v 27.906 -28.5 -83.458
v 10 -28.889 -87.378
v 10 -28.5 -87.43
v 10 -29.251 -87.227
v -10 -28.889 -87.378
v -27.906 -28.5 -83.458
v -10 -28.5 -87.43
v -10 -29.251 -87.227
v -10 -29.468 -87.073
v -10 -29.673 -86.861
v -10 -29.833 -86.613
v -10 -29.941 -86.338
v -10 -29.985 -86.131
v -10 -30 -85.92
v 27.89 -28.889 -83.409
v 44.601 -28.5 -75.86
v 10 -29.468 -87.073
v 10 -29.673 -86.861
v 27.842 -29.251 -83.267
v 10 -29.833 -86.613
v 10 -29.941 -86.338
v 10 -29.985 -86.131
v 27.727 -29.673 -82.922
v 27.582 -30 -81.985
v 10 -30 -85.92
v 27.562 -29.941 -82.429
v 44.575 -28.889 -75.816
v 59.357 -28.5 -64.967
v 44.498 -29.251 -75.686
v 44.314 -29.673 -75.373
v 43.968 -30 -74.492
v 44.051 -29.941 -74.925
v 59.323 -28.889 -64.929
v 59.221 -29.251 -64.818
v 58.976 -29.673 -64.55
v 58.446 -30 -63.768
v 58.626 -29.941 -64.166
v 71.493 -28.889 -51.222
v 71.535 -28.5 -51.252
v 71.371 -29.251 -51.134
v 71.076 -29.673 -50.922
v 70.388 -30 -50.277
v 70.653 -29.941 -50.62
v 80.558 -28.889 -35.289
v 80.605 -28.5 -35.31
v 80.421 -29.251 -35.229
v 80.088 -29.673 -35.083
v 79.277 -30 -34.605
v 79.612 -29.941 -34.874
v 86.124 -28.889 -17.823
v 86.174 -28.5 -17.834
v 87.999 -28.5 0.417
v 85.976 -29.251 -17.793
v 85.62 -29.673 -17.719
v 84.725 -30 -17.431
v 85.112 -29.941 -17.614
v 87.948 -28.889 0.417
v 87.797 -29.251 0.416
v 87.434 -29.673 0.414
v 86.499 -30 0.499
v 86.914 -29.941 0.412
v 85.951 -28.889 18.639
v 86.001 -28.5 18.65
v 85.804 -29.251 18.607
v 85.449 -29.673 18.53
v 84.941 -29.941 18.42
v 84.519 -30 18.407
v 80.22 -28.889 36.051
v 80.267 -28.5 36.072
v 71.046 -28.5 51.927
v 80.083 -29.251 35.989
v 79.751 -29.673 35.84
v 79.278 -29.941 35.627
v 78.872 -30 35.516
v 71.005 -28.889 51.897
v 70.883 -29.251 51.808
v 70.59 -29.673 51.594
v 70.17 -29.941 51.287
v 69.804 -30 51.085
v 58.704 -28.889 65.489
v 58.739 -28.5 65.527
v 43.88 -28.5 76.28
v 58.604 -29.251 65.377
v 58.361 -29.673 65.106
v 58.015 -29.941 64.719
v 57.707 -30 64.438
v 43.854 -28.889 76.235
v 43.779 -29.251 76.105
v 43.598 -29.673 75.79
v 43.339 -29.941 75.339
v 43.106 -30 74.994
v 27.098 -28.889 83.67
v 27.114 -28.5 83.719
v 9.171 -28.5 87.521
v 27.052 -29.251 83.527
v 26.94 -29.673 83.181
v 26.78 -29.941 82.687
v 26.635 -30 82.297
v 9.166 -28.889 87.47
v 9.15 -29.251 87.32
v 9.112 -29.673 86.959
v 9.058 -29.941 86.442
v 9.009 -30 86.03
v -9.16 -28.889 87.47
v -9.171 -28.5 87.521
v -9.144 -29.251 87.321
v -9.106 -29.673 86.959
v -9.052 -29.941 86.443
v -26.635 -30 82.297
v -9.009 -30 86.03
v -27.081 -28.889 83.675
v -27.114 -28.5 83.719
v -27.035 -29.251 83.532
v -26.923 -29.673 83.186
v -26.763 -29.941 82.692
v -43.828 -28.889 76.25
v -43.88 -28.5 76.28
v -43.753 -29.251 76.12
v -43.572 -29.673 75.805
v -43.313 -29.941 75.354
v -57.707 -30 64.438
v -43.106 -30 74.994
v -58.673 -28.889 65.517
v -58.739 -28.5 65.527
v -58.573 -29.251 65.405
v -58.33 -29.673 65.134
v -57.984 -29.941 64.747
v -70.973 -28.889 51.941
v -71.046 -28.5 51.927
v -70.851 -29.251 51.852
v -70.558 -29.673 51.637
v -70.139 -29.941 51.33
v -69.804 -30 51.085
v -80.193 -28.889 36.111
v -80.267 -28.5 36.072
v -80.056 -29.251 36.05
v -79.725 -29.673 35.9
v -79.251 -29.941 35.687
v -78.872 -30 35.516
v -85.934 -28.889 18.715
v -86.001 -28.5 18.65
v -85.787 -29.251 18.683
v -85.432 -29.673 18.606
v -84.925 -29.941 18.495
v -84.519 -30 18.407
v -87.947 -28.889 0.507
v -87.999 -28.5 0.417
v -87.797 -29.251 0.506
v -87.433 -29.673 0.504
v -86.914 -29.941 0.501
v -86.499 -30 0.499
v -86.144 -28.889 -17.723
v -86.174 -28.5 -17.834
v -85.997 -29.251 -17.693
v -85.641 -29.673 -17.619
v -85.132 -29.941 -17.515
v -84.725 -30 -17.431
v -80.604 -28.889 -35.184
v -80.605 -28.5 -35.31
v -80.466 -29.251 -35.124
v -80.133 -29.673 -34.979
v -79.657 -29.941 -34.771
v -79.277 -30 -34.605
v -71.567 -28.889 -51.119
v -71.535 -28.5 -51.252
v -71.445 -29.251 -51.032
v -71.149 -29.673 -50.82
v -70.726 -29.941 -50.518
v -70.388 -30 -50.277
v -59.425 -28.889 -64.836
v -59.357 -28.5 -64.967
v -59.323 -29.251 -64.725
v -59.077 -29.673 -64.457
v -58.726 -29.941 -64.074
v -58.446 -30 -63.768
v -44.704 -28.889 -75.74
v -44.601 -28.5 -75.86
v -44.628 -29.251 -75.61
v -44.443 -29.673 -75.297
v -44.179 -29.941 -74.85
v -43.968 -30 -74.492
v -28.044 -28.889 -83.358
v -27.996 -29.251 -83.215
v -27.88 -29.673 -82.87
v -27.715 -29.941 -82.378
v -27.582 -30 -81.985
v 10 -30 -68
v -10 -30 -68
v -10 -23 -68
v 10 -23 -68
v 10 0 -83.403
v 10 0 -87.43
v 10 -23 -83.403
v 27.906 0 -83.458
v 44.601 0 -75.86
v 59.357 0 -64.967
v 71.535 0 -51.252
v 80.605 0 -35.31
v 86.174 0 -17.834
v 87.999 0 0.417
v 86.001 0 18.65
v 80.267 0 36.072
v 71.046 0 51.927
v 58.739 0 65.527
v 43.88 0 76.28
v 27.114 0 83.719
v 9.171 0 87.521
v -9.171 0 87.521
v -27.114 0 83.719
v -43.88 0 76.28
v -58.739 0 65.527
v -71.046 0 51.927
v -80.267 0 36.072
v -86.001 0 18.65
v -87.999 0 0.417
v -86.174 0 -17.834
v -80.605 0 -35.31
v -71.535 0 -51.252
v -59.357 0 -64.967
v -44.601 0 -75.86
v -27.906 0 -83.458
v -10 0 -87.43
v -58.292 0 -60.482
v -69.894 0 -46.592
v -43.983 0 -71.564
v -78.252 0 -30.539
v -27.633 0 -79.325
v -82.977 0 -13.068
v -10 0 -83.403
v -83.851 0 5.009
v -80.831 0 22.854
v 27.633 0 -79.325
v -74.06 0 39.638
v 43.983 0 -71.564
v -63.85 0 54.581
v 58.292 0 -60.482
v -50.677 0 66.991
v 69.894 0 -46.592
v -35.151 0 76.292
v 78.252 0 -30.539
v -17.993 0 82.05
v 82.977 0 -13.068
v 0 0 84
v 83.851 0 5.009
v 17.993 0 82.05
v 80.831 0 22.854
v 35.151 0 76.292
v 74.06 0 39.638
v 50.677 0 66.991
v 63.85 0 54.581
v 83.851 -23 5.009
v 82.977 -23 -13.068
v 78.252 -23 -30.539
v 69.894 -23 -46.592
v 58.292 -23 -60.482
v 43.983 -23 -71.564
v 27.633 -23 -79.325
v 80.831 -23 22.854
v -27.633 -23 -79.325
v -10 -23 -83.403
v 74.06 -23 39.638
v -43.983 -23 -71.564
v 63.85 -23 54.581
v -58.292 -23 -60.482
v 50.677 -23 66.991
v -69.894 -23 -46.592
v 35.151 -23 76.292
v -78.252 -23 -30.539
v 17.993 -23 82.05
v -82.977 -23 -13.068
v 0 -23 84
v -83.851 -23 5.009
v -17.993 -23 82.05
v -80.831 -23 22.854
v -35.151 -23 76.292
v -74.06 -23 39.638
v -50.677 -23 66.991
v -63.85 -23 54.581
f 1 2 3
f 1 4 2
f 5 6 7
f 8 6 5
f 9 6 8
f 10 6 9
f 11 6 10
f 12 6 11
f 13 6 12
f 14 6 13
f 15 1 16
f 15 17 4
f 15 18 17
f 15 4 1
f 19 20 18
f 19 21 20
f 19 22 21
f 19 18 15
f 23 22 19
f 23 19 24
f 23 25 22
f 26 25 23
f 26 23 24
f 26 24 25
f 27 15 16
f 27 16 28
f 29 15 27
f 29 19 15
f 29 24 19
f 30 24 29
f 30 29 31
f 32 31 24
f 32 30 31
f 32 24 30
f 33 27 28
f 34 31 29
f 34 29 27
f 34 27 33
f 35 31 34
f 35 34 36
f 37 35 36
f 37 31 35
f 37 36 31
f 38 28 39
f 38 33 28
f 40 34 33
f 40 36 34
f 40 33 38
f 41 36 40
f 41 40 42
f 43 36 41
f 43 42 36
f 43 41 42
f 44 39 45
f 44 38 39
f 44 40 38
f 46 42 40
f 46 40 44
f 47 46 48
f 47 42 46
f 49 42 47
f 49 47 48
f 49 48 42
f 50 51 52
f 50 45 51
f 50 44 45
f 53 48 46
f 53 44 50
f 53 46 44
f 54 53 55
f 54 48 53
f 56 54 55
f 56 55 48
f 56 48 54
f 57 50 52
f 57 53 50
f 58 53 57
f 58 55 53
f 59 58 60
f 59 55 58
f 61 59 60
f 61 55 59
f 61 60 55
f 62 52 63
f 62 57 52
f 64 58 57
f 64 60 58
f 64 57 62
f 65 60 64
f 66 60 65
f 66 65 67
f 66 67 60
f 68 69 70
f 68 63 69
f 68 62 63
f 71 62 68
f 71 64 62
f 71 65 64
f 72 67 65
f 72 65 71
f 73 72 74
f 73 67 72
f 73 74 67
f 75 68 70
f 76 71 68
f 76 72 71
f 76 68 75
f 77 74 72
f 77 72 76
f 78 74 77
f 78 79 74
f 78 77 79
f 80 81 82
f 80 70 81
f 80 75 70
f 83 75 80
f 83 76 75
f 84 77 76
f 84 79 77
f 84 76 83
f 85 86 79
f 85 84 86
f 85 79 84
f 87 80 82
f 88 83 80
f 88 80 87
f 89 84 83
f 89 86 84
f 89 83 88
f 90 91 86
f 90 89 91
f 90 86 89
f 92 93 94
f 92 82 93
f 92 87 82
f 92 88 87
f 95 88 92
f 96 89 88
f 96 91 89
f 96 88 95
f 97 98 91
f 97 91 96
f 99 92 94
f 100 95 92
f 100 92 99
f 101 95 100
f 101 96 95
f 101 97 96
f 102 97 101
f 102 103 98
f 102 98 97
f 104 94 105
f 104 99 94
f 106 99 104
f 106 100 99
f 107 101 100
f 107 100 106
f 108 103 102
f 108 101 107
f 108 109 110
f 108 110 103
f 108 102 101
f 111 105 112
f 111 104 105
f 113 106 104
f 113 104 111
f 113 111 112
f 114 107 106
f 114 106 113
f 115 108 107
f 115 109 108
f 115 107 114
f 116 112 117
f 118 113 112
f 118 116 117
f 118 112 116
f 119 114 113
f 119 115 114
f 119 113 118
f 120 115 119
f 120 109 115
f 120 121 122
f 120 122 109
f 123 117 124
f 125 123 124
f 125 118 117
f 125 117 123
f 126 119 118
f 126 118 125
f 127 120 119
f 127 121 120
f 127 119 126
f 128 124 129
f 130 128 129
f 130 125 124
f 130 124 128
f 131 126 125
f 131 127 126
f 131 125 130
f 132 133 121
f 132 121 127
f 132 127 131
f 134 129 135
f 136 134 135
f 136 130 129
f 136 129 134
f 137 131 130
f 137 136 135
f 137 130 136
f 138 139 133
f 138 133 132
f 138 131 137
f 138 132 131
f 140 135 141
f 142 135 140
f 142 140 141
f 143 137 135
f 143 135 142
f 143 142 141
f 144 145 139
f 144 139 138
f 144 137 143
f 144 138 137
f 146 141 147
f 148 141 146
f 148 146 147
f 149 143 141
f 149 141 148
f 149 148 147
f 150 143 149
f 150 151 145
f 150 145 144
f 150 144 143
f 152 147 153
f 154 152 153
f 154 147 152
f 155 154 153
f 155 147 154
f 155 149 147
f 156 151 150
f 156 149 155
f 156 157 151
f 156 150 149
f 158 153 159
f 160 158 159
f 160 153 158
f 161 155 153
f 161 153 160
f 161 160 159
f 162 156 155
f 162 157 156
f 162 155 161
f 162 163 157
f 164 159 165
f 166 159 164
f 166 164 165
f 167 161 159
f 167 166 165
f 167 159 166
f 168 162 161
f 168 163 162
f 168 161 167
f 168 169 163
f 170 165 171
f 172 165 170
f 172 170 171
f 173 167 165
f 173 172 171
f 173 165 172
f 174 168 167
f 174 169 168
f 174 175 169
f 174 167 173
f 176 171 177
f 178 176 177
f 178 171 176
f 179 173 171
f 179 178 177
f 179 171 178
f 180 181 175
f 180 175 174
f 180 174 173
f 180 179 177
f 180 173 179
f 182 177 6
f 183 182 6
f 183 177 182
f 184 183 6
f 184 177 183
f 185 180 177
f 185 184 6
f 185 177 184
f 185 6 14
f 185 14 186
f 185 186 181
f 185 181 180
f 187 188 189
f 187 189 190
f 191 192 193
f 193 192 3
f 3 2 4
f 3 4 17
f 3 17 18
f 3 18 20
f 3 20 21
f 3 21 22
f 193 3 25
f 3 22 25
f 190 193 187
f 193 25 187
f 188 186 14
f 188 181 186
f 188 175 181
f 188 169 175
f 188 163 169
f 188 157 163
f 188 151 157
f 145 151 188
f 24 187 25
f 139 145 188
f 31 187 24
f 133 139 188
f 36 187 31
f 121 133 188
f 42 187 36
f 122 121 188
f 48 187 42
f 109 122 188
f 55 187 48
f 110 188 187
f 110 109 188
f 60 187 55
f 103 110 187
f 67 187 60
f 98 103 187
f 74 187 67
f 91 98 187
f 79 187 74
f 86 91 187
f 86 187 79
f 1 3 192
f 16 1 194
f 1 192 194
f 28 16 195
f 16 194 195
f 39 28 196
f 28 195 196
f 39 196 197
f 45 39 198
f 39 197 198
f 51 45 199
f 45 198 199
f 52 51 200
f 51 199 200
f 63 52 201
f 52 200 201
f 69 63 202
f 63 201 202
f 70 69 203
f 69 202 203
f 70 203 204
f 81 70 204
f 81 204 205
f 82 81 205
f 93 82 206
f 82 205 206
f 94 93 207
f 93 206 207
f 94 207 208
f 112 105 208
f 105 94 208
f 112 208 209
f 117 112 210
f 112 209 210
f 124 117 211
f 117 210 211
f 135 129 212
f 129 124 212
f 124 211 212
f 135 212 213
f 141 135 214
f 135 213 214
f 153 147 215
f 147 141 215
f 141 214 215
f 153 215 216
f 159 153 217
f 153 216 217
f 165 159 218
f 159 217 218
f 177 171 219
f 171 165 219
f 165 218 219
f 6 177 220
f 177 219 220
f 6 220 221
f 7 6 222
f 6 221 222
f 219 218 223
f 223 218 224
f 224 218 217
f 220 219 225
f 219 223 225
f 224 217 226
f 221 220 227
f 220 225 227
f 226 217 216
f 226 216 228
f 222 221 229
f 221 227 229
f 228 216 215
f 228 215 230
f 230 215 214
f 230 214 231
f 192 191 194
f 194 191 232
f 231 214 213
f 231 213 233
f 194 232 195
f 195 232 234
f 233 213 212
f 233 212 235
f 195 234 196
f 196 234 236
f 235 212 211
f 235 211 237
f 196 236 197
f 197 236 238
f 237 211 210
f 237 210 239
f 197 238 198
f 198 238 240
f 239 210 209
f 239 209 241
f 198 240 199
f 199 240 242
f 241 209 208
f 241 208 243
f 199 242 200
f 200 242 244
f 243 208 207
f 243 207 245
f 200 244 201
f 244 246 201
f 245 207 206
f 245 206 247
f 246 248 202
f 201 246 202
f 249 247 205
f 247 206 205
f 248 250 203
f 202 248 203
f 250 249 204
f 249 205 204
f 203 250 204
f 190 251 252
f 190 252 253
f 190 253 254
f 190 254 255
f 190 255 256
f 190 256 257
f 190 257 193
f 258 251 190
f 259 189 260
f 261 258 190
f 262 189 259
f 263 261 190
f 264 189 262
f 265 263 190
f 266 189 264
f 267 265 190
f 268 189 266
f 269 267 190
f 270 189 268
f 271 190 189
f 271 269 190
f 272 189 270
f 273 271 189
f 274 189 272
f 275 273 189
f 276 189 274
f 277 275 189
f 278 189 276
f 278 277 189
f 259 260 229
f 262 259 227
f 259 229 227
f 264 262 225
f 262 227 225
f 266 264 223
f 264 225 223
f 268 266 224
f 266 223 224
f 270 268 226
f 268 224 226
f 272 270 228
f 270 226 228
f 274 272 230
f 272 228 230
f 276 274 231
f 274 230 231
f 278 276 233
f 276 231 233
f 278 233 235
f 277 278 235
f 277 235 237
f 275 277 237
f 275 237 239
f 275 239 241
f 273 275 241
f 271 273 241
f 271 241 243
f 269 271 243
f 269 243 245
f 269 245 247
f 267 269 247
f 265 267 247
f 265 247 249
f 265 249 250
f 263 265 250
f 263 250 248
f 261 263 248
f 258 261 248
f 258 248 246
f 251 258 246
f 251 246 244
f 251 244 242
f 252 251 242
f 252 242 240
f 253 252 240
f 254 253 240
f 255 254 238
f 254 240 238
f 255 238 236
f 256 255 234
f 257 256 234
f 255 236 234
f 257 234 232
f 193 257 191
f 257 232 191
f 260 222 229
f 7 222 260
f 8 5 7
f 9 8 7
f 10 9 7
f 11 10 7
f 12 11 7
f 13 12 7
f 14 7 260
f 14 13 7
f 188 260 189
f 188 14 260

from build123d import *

# Parameters (mm, degrees)
F0_R     = 88
F1_DEPTH = 30
F2_R     = 84
F3_DEPTH = 23
F4_R     = 1.5
F5_W     = 20
F5_H     = 20
F6_DEPTH = 30.001


# Not quite as in the source:
# - a feature names something its author has since deleted; it is built from what else it names


with BuildPart() as f1:
    # F0 (on Front) → F1 (new body)
    with BuildSketch(Plane.XZ):
        Circle(F0_R)
    extrude(amount=F1_DEPTH)

    # F2 (on face) → F3 (cut)
    with BuildSketch(Plane(origin=(0, 0, 0), x_dir=(-1, 0, 0), z_dir=(0, 1, 0))):
        Circle(F2_R)
    extrude(amount=-F3_DEPTH, mode=Mode.SUBTRACT)

    # F4
    f4_edges = [f1.edges().sort_by_distance(p)[0] for p in [
        (-88, -30, 0),
    ]]
    fillet(f4_edges, radius=F4_R)

    # F5 (on face) → F6 (cut, through all)
    with BuildSketch(Plane.XZ.offset(30)):
        with Locations((0, -78)):
            Rectangle(F5_W, F5_H)
    extrude(amount=-F6_DEPTH, mode=Mode.SUBTRACT)


solid = f1.part
